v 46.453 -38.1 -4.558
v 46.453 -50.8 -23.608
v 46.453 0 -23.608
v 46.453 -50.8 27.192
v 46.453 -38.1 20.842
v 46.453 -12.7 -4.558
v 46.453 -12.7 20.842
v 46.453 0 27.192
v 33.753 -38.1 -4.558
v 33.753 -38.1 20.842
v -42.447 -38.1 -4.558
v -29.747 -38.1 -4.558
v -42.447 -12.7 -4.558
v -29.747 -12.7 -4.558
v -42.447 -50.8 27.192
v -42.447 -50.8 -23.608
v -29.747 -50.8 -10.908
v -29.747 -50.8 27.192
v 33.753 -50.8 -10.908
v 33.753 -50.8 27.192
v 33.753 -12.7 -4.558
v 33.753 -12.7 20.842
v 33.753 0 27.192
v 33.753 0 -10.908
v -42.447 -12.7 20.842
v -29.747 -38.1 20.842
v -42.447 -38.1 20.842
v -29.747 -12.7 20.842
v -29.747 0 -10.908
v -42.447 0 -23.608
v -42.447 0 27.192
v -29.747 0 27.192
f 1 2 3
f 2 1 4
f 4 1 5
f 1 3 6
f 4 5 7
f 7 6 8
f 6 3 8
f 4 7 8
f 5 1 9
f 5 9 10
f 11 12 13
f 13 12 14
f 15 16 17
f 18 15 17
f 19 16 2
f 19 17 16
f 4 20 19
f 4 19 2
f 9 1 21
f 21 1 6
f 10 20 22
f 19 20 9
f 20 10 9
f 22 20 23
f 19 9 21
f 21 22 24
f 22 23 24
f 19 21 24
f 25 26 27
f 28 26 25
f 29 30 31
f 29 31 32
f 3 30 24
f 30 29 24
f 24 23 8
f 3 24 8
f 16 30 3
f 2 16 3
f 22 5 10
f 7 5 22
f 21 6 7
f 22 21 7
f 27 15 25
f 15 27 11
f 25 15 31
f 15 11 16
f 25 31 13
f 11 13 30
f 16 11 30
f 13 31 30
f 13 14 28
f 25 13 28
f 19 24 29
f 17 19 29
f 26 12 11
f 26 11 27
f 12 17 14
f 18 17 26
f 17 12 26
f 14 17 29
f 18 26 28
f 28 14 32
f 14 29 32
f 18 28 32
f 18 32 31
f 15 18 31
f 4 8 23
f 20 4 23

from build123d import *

# Parameters (mm, degrees)
F1_DEPTH = 50.8
F2_W     = 25.4
F2_H     = 25.4
F3_DEPTH = 88.901


with BuildPart() as f1:
    # F0 (on Front) → F1 (new body)
    with BuildSketch(Plane.XZ):
        Polygon((-29.747168, 27.1924), (-42.447168, 27.1924), (-42.447168, -23.6076), (46.452832, -23.6076), (46.452832, 27.1924), (33.752832, 27.1924), (33.752832, -10.9076), (-29.747168, -10.9076), align=None)
    extrude(amount=F1_DEPTH)

    # F2 (on face) → F3 (cut, through all)
    with BuildSketch(Plane.YZ.offset(46.452832)):
        with Locations((-25.4, 8.1424)):
            Rectangle(F2_W, F2_H)
    extrude(amount=-F3_DEPTH, mode=Mode.SUBTRACT)


solid = f1.part
